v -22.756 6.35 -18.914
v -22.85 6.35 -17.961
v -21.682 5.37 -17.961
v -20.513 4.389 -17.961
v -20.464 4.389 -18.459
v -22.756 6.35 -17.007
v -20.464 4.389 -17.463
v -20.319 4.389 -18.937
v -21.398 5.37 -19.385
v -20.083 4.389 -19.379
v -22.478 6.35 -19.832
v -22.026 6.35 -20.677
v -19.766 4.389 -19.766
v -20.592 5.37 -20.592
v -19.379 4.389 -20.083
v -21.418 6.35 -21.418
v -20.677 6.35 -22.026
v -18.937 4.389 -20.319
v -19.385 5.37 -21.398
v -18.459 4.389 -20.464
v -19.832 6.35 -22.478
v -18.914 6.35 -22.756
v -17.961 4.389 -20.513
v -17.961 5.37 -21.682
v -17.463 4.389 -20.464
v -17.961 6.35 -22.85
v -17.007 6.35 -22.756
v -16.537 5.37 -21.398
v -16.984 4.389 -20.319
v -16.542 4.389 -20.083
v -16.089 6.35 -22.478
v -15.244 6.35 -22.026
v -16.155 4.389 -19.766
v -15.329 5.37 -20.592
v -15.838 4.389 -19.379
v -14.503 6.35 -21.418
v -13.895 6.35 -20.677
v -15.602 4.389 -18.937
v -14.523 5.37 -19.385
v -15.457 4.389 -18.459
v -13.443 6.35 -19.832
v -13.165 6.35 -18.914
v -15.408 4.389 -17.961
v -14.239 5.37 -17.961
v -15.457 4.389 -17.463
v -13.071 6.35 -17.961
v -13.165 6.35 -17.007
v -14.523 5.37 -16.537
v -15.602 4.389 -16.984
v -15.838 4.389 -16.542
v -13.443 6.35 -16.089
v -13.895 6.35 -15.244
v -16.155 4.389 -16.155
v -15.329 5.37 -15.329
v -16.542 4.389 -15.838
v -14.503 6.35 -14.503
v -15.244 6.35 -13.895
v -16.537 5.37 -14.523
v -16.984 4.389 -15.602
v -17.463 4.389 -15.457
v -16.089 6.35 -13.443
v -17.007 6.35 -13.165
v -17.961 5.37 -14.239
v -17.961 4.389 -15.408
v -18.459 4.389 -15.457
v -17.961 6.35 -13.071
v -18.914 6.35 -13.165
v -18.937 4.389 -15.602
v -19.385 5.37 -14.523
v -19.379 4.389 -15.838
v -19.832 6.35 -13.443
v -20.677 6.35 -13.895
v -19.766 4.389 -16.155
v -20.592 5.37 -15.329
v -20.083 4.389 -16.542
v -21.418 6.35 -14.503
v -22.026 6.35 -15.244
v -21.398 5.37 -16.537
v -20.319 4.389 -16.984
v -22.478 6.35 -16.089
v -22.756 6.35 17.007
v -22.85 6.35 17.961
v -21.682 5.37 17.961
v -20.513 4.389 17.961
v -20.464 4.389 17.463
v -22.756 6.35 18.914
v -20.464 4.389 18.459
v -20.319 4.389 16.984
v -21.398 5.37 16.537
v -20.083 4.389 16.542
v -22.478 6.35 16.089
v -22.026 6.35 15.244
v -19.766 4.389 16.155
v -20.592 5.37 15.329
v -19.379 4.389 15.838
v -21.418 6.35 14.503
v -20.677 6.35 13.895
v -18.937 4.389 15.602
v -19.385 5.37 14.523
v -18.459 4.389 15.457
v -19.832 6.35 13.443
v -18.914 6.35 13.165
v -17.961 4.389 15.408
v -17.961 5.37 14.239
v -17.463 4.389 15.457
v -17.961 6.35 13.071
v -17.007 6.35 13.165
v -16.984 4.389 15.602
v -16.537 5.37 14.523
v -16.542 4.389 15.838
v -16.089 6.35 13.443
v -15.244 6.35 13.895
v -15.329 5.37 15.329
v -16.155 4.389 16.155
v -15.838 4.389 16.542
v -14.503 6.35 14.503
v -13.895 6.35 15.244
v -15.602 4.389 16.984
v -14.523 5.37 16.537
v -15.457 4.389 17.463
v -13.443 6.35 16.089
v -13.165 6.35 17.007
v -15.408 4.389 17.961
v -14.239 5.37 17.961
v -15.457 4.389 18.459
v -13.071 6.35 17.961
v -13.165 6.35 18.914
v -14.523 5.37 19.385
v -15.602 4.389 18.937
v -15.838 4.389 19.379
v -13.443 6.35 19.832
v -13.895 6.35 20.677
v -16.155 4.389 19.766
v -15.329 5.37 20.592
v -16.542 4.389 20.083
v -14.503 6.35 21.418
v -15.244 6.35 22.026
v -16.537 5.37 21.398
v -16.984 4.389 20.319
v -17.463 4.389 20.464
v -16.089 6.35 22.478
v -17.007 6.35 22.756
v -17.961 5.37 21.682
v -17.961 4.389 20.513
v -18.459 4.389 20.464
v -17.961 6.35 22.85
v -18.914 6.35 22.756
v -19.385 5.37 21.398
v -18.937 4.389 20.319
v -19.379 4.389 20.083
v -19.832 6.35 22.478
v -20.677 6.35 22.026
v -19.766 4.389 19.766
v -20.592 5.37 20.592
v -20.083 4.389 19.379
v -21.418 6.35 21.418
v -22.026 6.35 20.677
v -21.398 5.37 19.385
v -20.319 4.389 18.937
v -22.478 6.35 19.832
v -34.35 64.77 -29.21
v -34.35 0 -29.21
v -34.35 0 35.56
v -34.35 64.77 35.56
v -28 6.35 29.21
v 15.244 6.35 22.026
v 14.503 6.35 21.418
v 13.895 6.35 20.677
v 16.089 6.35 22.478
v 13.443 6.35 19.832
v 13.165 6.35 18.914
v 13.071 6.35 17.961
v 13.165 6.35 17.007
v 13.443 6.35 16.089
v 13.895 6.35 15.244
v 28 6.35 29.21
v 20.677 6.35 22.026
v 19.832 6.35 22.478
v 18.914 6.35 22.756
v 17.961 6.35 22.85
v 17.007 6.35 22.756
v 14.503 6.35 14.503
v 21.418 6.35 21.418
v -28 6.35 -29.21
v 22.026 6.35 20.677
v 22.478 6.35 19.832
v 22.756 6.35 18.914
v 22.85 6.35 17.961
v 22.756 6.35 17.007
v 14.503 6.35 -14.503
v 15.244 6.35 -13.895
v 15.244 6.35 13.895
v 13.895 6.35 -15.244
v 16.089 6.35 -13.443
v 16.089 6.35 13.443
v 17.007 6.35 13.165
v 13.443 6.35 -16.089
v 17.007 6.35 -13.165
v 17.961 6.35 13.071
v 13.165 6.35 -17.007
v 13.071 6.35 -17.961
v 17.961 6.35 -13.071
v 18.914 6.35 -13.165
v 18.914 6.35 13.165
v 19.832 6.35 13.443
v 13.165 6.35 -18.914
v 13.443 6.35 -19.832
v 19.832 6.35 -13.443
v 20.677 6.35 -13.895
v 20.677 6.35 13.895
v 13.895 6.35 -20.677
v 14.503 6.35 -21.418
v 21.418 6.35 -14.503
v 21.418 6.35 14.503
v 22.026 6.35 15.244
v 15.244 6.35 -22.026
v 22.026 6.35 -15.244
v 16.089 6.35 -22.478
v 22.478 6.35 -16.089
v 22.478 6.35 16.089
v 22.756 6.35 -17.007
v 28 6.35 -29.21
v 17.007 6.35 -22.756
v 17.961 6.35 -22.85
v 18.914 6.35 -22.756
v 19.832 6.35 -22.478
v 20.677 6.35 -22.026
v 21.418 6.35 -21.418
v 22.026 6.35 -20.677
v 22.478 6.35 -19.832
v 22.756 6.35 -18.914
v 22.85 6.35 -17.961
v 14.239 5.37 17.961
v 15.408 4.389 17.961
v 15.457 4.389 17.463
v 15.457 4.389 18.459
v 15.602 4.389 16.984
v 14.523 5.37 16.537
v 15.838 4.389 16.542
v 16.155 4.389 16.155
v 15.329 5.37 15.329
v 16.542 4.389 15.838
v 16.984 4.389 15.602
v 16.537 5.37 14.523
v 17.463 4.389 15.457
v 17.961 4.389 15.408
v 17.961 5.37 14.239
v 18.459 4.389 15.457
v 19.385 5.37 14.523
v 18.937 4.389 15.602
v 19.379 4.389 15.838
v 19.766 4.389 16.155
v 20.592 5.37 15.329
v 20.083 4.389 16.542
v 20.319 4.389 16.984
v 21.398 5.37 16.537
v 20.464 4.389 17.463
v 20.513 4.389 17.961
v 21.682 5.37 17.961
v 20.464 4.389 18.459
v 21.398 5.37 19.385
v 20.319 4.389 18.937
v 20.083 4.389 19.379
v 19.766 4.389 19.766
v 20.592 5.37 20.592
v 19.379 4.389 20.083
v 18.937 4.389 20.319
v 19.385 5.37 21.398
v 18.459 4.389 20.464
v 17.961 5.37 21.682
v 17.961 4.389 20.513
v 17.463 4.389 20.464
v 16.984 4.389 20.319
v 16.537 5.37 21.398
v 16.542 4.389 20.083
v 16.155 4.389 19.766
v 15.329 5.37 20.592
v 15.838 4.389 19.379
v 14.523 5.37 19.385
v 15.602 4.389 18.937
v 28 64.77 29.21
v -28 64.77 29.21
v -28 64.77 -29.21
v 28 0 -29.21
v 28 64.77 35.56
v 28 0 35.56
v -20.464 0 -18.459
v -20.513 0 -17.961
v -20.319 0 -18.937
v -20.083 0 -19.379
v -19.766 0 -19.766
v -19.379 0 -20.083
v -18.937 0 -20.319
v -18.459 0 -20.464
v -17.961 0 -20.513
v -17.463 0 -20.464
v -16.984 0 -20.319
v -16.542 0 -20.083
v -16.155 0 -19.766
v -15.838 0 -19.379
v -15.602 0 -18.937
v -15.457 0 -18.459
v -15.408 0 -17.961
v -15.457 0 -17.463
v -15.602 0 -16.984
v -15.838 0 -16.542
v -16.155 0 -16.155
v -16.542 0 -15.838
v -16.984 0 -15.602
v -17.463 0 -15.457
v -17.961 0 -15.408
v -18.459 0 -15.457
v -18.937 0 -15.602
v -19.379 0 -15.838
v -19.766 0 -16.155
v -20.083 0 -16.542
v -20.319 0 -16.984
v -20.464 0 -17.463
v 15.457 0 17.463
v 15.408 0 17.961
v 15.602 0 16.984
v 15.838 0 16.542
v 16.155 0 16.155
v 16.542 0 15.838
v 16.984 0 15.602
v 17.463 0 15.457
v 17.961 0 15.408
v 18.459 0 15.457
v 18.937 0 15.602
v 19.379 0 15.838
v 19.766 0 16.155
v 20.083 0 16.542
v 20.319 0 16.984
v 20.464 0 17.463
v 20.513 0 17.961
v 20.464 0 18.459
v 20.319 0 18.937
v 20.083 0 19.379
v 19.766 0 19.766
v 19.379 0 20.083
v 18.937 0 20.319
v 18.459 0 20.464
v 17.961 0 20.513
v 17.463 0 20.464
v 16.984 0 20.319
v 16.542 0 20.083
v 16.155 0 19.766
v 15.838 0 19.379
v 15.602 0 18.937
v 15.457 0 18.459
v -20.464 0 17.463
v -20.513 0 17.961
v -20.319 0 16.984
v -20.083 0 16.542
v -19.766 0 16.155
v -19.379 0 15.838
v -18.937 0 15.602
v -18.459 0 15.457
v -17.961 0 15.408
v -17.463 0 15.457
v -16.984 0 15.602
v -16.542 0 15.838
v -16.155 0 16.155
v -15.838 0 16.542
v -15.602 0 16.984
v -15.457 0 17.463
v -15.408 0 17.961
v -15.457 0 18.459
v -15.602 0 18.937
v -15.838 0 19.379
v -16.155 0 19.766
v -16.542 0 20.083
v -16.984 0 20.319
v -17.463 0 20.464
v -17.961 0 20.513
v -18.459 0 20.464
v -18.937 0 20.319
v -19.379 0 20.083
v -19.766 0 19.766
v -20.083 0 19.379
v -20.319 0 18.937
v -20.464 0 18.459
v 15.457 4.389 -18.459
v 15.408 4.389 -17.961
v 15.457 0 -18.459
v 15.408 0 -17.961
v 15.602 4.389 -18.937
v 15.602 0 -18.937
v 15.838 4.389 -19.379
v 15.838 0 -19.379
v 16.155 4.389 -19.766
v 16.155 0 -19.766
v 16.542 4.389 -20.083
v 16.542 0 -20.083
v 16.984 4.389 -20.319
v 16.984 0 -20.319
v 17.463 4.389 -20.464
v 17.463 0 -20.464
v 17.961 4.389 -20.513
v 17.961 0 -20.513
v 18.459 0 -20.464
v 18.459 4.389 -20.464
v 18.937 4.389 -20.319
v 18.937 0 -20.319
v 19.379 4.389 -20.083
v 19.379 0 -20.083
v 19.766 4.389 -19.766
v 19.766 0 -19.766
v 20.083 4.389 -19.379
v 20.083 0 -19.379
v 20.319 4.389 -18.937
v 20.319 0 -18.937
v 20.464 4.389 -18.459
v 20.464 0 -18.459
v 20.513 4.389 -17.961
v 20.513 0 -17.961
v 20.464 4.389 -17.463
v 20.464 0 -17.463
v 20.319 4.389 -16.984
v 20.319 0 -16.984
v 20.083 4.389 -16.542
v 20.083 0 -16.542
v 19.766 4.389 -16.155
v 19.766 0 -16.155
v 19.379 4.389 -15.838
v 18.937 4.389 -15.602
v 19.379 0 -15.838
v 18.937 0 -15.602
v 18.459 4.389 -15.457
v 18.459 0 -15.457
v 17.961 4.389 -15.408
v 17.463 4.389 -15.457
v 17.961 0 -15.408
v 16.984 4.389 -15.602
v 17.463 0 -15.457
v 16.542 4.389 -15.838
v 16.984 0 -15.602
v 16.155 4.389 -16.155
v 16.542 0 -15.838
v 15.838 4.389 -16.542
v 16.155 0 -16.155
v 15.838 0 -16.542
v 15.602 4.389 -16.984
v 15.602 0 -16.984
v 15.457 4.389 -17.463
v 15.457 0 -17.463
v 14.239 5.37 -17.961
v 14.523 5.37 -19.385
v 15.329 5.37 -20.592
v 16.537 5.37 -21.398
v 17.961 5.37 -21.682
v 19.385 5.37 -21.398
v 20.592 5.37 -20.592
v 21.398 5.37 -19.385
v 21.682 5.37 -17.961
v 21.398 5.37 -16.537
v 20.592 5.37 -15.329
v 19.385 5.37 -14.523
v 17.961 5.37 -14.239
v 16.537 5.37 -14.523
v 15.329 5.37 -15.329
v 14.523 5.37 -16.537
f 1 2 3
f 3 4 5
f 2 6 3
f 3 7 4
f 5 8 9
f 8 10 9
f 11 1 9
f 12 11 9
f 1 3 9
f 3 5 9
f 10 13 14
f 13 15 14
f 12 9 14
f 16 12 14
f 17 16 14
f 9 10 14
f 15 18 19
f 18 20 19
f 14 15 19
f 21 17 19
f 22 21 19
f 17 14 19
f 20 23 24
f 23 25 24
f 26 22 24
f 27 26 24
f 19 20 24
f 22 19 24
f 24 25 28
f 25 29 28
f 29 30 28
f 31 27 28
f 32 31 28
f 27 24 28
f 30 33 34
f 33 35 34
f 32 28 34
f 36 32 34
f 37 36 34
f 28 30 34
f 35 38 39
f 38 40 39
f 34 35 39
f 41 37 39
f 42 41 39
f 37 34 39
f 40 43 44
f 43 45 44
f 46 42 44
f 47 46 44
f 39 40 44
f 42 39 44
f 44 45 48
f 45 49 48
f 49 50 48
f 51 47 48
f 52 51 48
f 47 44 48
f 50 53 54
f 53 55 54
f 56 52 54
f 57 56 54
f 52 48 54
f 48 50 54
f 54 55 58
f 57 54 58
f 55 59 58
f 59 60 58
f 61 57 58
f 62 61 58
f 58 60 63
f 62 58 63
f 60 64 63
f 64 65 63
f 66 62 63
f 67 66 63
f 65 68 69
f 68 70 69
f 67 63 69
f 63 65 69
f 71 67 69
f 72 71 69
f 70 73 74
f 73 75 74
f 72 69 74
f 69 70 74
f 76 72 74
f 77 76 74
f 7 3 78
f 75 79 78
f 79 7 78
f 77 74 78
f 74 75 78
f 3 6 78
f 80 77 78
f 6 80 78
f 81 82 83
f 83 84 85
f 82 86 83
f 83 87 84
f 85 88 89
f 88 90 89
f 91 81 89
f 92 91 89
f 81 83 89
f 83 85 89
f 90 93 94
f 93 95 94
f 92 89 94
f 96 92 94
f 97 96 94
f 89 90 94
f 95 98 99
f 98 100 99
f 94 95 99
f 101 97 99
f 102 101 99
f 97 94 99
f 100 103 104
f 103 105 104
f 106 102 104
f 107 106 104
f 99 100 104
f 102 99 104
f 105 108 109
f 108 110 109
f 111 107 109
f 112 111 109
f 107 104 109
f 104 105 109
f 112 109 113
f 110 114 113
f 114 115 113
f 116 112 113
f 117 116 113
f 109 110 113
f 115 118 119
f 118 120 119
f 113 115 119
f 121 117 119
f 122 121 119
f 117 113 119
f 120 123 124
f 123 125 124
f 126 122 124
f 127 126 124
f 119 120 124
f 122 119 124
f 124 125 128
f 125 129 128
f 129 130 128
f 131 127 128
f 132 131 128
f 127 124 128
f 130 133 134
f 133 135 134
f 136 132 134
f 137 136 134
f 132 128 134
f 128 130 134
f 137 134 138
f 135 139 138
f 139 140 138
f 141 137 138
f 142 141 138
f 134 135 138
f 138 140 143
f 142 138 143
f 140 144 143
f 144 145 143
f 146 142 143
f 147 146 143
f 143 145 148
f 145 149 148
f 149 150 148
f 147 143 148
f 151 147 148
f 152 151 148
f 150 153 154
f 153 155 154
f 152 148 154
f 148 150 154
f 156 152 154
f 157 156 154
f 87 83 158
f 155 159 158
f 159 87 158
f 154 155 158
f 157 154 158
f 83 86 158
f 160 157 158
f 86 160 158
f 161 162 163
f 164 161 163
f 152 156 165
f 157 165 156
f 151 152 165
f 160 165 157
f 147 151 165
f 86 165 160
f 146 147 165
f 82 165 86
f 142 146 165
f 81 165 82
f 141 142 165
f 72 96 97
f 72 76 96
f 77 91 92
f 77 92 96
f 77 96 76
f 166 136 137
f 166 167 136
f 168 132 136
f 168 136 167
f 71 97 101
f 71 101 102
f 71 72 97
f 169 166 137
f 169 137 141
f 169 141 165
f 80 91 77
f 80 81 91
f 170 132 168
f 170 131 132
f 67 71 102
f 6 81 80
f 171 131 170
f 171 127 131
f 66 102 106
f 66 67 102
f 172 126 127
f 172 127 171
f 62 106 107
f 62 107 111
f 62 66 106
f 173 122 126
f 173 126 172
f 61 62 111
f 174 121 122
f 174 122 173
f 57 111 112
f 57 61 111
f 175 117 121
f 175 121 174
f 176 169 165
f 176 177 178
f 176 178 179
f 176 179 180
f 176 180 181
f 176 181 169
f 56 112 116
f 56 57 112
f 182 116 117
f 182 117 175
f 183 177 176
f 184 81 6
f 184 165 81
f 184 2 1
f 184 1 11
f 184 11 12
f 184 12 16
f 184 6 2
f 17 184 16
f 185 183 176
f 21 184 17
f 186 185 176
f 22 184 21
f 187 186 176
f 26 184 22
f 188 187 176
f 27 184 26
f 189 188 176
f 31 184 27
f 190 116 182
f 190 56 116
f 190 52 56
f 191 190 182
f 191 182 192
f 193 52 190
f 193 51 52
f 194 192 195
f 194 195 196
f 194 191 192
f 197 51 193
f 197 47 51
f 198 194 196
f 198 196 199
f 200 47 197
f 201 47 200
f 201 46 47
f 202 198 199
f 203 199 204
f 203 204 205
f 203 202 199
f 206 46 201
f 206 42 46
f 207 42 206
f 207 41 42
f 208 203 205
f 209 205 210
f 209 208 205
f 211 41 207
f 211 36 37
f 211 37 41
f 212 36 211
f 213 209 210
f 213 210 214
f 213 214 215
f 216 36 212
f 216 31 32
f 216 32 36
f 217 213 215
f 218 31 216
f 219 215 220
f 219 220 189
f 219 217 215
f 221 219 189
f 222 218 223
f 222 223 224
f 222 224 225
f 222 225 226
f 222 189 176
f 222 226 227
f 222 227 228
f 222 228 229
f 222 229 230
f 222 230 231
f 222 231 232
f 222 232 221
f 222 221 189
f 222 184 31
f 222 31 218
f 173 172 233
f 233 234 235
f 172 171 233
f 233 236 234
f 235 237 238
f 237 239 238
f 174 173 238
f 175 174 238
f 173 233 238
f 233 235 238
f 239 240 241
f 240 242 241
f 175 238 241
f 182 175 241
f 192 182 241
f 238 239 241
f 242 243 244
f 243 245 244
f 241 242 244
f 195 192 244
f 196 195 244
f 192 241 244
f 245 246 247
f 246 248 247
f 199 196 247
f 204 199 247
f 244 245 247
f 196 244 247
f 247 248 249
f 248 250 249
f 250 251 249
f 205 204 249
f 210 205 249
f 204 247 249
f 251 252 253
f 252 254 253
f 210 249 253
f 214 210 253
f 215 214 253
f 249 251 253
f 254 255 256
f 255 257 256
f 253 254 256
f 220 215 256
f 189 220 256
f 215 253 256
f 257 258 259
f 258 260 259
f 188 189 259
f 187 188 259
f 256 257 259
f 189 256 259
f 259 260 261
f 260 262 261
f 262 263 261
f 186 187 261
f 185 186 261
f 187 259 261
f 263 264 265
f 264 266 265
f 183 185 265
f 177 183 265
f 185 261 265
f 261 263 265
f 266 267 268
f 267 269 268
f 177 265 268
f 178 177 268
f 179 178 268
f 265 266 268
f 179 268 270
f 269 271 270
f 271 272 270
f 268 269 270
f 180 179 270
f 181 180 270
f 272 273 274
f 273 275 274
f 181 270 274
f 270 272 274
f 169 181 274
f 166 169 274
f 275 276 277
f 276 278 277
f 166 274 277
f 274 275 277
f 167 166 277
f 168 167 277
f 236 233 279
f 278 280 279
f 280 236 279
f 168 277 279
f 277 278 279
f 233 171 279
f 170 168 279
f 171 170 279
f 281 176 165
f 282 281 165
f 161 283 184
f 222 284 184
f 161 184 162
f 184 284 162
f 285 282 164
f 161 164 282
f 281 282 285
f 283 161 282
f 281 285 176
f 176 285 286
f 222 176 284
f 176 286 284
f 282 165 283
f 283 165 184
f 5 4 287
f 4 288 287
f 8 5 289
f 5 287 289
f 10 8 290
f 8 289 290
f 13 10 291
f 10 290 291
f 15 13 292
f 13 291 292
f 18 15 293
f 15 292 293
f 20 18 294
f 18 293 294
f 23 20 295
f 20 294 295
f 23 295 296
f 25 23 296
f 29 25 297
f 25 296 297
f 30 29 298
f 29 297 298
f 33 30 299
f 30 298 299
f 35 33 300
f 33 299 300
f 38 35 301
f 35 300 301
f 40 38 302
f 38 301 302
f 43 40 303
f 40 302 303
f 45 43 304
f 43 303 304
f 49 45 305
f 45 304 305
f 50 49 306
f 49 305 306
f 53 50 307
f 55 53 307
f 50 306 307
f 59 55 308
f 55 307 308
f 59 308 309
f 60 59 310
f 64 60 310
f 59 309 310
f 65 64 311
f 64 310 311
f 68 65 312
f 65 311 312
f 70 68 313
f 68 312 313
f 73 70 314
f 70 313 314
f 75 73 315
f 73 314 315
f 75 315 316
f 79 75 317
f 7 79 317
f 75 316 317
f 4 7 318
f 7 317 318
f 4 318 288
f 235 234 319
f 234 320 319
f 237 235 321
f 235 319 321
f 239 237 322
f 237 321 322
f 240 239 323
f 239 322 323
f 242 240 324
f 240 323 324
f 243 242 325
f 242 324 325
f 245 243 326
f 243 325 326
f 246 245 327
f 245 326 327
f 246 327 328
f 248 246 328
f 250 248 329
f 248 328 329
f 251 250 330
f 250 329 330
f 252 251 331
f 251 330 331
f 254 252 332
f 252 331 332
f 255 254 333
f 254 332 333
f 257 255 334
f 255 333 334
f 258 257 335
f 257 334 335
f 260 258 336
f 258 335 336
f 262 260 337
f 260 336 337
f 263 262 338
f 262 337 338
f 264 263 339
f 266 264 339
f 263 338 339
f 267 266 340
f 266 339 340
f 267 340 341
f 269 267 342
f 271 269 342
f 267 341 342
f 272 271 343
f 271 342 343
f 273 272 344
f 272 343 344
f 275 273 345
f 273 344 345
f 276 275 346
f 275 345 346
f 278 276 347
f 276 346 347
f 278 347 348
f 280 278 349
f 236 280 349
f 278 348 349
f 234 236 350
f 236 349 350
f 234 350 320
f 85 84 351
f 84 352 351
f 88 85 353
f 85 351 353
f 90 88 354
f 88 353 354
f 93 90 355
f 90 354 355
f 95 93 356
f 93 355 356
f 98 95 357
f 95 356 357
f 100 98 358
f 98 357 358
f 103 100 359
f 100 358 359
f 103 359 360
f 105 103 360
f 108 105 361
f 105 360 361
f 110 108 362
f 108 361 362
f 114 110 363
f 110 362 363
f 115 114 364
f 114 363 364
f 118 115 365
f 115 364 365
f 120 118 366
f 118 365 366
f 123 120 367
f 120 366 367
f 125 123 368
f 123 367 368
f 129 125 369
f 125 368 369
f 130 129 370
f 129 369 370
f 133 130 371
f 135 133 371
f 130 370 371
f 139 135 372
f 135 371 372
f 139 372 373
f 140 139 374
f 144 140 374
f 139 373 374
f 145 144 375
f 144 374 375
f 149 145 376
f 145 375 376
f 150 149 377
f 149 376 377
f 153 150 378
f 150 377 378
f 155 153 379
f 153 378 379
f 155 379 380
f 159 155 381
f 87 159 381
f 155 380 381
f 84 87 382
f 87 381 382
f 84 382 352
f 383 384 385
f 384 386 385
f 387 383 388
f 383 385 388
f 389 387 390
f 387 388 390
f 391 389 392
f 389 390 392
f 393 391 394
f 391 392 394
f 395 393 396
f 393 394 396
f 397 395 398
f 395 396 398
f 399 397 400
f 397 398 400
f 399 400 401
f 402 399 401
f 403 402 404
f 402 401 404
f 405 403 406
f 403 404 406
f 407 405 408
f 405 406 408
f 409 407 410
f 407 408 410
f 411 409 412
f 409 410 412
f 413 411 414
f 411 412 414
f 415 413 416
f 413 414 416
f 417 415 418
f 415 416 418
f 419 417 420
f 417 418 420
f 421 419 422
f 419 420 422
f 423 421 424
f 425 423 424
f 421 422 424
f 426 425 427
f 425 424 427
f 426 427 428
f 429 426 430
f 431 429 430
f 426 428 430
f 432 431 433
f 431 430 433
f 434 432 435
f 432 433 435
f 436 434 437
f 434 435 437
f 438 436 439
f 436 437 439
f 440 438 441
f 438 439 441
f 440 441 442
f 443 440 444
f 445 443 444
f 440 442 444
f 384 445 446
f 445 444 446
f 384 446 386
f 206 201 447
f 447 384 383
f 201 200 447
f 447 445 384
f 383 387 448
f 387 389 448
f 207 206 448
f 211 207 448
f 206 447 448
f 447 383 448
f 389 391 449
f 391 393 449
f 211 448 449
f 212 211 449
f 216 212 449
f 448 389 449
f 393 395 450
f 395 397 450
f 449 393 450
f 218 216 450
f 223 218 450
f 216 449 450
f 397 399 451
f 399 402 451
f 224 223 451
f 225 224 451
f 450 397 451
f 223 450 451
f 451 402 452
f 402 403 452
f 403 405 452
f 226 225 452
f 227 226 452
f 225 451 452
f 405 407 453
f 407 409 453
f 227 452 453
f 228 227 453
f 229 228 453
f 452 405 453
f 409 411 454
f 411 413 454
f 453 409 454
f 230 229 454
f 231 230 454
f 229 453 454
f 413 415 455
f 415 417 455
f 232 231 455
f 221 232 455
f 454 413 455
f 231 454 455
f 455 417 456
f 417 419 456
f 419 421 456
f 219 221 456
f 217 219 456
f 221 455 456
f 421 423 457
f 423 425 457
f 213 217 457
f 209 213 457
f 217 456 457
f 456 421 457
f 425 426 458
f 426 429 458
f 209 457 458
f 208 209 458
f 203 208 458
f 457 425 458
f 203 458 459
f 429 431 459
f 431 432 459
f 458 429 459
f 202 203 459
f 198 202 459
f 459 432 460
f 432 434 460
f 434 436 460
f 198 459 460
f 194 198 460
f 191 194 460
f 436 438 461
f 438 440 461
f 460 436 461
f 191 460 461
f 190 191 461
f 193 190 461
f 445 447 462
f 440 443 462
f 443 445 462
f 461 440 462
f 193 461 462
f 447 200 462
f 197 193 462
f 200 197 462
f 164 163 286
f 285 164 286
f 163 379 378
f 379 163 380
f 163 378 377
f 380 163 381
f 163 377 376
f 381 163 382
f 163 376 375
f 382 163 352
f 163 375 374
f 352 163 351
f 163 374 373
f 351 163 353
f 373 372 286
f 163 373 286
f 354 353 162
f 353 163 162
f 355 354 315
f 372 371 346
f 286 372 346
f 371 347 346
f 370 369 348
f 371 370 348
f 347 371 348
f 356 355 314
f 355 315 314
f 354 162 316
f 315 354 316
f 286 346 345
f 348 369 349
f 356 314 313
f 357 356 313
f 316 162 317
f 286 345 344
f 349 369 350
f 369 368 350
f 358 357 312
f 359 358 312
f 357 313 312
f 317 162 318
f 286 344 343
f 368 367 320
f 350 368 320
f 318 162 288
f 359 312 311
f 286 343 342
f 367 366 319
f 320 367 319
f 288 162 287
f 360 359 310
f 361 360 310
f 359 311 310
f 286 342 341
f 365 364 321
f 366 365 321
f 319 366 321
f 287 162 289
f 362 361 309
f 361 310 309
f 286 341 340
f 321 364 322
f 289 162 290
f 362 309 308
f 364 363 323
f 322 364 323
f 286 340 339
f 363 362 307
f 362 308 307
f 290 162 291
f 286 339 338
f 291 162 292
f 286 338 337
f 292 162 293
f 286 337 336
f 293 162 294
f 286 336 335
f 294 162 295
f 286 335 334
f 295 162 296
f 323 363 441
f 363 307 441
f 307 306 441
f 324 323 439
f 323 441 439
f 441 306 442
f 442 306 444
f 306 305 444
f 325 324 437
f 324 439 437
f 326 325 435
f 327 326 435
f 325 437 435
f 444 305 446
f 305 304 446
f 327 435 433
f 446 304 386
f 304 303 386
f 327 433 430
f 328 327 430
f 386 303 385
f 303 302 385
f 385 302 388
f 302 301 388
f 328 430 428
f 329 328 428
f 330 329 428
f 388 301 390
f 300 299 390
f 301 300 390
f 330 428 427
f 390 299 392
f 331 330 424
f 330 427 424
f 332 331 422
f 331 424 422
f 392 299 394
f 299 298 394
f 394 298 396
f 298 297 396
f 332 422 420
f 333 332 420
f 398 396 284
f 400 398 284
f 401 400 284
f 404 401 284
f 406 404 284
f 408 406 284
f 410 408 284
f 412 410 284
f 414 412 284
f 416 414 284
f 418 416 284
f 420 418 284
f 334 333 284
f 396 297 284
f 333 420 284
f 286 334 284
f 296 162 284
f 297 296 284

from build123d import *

# Parameters (mm, degrees)
MOTORPROFILE_W                                     = 56
MOTORPROFILE_H                                     = 58.42
BOSS_EXTRUDE2_DEPTH                                = 6.35
BOSS_EXTRUDE3_DEPTH                                = 64.77
CSK_FOR_10_FLAT_HEAD_MACHINE_SCREW_100_D           = 5.1054
CSK_FOR_10_FLAT_HEAD_MACHINE_SCREW_100_CSINK_D     = 9.779
CSK_FOR_10_FLAT_HEAD_MACHINE_SCREW_100_CSINK_ANGLE = 100


with BuildPart() as part:
    # MotorProfile → Boss-Extrude2 (new body)
    with BuildSketch(Plane(origin=(0, 0, 0), x_dir=(1, 0, 0), z_dir=(0, 1, 0))):
        Rectangle(MOTORPROFILE_W, MOTORPROFILE_H)
    extrude(amount=BOSS_EXTRUDE2_DEPTH)

    # Sketch2 → Boss-Extrude3 (add)
    with BuildSketch(Plane(origin=(0, 0, 0), x_dir=(1, 0, 0), z_dir=(0, 1, 0))):
        Polygon((-34.35, 29.21), (-34.35, -35.56), (28, -35.56), (28, -29.21), (-28, -29.21), (-28, 29.21), align=None)
    extrude(amount=BOSS_EXTRUDE3_DEPTH)

    # CSK for #10 Flat Head Machine Screw (100)1 (through all)
    with Locations(Plane(origin=(0, 6.35, 0), x_dir=(1, 0, 0), z_dir=(0, 1, 0))):
        with Locations((-17.960512242, 17.960512242), (-17.960512242, -17.960512242), (17.960512242, -17.960512242), (17.960512242, 17.960512242)):
            CounterSinkHole(CSK_FOR_10_FLAT_HEAD_MACHINE_SCREW_100_D / 2, CSK_FOR_10_FLAT_HEAD_MACHINE_SCREW_100_CSINK_D / 2, counter_sink_angle=CSK_FOR_10_FLAT_HEAD_MACHINE_SCREW_100_CSINK_ANGLE)


solid = part.part
